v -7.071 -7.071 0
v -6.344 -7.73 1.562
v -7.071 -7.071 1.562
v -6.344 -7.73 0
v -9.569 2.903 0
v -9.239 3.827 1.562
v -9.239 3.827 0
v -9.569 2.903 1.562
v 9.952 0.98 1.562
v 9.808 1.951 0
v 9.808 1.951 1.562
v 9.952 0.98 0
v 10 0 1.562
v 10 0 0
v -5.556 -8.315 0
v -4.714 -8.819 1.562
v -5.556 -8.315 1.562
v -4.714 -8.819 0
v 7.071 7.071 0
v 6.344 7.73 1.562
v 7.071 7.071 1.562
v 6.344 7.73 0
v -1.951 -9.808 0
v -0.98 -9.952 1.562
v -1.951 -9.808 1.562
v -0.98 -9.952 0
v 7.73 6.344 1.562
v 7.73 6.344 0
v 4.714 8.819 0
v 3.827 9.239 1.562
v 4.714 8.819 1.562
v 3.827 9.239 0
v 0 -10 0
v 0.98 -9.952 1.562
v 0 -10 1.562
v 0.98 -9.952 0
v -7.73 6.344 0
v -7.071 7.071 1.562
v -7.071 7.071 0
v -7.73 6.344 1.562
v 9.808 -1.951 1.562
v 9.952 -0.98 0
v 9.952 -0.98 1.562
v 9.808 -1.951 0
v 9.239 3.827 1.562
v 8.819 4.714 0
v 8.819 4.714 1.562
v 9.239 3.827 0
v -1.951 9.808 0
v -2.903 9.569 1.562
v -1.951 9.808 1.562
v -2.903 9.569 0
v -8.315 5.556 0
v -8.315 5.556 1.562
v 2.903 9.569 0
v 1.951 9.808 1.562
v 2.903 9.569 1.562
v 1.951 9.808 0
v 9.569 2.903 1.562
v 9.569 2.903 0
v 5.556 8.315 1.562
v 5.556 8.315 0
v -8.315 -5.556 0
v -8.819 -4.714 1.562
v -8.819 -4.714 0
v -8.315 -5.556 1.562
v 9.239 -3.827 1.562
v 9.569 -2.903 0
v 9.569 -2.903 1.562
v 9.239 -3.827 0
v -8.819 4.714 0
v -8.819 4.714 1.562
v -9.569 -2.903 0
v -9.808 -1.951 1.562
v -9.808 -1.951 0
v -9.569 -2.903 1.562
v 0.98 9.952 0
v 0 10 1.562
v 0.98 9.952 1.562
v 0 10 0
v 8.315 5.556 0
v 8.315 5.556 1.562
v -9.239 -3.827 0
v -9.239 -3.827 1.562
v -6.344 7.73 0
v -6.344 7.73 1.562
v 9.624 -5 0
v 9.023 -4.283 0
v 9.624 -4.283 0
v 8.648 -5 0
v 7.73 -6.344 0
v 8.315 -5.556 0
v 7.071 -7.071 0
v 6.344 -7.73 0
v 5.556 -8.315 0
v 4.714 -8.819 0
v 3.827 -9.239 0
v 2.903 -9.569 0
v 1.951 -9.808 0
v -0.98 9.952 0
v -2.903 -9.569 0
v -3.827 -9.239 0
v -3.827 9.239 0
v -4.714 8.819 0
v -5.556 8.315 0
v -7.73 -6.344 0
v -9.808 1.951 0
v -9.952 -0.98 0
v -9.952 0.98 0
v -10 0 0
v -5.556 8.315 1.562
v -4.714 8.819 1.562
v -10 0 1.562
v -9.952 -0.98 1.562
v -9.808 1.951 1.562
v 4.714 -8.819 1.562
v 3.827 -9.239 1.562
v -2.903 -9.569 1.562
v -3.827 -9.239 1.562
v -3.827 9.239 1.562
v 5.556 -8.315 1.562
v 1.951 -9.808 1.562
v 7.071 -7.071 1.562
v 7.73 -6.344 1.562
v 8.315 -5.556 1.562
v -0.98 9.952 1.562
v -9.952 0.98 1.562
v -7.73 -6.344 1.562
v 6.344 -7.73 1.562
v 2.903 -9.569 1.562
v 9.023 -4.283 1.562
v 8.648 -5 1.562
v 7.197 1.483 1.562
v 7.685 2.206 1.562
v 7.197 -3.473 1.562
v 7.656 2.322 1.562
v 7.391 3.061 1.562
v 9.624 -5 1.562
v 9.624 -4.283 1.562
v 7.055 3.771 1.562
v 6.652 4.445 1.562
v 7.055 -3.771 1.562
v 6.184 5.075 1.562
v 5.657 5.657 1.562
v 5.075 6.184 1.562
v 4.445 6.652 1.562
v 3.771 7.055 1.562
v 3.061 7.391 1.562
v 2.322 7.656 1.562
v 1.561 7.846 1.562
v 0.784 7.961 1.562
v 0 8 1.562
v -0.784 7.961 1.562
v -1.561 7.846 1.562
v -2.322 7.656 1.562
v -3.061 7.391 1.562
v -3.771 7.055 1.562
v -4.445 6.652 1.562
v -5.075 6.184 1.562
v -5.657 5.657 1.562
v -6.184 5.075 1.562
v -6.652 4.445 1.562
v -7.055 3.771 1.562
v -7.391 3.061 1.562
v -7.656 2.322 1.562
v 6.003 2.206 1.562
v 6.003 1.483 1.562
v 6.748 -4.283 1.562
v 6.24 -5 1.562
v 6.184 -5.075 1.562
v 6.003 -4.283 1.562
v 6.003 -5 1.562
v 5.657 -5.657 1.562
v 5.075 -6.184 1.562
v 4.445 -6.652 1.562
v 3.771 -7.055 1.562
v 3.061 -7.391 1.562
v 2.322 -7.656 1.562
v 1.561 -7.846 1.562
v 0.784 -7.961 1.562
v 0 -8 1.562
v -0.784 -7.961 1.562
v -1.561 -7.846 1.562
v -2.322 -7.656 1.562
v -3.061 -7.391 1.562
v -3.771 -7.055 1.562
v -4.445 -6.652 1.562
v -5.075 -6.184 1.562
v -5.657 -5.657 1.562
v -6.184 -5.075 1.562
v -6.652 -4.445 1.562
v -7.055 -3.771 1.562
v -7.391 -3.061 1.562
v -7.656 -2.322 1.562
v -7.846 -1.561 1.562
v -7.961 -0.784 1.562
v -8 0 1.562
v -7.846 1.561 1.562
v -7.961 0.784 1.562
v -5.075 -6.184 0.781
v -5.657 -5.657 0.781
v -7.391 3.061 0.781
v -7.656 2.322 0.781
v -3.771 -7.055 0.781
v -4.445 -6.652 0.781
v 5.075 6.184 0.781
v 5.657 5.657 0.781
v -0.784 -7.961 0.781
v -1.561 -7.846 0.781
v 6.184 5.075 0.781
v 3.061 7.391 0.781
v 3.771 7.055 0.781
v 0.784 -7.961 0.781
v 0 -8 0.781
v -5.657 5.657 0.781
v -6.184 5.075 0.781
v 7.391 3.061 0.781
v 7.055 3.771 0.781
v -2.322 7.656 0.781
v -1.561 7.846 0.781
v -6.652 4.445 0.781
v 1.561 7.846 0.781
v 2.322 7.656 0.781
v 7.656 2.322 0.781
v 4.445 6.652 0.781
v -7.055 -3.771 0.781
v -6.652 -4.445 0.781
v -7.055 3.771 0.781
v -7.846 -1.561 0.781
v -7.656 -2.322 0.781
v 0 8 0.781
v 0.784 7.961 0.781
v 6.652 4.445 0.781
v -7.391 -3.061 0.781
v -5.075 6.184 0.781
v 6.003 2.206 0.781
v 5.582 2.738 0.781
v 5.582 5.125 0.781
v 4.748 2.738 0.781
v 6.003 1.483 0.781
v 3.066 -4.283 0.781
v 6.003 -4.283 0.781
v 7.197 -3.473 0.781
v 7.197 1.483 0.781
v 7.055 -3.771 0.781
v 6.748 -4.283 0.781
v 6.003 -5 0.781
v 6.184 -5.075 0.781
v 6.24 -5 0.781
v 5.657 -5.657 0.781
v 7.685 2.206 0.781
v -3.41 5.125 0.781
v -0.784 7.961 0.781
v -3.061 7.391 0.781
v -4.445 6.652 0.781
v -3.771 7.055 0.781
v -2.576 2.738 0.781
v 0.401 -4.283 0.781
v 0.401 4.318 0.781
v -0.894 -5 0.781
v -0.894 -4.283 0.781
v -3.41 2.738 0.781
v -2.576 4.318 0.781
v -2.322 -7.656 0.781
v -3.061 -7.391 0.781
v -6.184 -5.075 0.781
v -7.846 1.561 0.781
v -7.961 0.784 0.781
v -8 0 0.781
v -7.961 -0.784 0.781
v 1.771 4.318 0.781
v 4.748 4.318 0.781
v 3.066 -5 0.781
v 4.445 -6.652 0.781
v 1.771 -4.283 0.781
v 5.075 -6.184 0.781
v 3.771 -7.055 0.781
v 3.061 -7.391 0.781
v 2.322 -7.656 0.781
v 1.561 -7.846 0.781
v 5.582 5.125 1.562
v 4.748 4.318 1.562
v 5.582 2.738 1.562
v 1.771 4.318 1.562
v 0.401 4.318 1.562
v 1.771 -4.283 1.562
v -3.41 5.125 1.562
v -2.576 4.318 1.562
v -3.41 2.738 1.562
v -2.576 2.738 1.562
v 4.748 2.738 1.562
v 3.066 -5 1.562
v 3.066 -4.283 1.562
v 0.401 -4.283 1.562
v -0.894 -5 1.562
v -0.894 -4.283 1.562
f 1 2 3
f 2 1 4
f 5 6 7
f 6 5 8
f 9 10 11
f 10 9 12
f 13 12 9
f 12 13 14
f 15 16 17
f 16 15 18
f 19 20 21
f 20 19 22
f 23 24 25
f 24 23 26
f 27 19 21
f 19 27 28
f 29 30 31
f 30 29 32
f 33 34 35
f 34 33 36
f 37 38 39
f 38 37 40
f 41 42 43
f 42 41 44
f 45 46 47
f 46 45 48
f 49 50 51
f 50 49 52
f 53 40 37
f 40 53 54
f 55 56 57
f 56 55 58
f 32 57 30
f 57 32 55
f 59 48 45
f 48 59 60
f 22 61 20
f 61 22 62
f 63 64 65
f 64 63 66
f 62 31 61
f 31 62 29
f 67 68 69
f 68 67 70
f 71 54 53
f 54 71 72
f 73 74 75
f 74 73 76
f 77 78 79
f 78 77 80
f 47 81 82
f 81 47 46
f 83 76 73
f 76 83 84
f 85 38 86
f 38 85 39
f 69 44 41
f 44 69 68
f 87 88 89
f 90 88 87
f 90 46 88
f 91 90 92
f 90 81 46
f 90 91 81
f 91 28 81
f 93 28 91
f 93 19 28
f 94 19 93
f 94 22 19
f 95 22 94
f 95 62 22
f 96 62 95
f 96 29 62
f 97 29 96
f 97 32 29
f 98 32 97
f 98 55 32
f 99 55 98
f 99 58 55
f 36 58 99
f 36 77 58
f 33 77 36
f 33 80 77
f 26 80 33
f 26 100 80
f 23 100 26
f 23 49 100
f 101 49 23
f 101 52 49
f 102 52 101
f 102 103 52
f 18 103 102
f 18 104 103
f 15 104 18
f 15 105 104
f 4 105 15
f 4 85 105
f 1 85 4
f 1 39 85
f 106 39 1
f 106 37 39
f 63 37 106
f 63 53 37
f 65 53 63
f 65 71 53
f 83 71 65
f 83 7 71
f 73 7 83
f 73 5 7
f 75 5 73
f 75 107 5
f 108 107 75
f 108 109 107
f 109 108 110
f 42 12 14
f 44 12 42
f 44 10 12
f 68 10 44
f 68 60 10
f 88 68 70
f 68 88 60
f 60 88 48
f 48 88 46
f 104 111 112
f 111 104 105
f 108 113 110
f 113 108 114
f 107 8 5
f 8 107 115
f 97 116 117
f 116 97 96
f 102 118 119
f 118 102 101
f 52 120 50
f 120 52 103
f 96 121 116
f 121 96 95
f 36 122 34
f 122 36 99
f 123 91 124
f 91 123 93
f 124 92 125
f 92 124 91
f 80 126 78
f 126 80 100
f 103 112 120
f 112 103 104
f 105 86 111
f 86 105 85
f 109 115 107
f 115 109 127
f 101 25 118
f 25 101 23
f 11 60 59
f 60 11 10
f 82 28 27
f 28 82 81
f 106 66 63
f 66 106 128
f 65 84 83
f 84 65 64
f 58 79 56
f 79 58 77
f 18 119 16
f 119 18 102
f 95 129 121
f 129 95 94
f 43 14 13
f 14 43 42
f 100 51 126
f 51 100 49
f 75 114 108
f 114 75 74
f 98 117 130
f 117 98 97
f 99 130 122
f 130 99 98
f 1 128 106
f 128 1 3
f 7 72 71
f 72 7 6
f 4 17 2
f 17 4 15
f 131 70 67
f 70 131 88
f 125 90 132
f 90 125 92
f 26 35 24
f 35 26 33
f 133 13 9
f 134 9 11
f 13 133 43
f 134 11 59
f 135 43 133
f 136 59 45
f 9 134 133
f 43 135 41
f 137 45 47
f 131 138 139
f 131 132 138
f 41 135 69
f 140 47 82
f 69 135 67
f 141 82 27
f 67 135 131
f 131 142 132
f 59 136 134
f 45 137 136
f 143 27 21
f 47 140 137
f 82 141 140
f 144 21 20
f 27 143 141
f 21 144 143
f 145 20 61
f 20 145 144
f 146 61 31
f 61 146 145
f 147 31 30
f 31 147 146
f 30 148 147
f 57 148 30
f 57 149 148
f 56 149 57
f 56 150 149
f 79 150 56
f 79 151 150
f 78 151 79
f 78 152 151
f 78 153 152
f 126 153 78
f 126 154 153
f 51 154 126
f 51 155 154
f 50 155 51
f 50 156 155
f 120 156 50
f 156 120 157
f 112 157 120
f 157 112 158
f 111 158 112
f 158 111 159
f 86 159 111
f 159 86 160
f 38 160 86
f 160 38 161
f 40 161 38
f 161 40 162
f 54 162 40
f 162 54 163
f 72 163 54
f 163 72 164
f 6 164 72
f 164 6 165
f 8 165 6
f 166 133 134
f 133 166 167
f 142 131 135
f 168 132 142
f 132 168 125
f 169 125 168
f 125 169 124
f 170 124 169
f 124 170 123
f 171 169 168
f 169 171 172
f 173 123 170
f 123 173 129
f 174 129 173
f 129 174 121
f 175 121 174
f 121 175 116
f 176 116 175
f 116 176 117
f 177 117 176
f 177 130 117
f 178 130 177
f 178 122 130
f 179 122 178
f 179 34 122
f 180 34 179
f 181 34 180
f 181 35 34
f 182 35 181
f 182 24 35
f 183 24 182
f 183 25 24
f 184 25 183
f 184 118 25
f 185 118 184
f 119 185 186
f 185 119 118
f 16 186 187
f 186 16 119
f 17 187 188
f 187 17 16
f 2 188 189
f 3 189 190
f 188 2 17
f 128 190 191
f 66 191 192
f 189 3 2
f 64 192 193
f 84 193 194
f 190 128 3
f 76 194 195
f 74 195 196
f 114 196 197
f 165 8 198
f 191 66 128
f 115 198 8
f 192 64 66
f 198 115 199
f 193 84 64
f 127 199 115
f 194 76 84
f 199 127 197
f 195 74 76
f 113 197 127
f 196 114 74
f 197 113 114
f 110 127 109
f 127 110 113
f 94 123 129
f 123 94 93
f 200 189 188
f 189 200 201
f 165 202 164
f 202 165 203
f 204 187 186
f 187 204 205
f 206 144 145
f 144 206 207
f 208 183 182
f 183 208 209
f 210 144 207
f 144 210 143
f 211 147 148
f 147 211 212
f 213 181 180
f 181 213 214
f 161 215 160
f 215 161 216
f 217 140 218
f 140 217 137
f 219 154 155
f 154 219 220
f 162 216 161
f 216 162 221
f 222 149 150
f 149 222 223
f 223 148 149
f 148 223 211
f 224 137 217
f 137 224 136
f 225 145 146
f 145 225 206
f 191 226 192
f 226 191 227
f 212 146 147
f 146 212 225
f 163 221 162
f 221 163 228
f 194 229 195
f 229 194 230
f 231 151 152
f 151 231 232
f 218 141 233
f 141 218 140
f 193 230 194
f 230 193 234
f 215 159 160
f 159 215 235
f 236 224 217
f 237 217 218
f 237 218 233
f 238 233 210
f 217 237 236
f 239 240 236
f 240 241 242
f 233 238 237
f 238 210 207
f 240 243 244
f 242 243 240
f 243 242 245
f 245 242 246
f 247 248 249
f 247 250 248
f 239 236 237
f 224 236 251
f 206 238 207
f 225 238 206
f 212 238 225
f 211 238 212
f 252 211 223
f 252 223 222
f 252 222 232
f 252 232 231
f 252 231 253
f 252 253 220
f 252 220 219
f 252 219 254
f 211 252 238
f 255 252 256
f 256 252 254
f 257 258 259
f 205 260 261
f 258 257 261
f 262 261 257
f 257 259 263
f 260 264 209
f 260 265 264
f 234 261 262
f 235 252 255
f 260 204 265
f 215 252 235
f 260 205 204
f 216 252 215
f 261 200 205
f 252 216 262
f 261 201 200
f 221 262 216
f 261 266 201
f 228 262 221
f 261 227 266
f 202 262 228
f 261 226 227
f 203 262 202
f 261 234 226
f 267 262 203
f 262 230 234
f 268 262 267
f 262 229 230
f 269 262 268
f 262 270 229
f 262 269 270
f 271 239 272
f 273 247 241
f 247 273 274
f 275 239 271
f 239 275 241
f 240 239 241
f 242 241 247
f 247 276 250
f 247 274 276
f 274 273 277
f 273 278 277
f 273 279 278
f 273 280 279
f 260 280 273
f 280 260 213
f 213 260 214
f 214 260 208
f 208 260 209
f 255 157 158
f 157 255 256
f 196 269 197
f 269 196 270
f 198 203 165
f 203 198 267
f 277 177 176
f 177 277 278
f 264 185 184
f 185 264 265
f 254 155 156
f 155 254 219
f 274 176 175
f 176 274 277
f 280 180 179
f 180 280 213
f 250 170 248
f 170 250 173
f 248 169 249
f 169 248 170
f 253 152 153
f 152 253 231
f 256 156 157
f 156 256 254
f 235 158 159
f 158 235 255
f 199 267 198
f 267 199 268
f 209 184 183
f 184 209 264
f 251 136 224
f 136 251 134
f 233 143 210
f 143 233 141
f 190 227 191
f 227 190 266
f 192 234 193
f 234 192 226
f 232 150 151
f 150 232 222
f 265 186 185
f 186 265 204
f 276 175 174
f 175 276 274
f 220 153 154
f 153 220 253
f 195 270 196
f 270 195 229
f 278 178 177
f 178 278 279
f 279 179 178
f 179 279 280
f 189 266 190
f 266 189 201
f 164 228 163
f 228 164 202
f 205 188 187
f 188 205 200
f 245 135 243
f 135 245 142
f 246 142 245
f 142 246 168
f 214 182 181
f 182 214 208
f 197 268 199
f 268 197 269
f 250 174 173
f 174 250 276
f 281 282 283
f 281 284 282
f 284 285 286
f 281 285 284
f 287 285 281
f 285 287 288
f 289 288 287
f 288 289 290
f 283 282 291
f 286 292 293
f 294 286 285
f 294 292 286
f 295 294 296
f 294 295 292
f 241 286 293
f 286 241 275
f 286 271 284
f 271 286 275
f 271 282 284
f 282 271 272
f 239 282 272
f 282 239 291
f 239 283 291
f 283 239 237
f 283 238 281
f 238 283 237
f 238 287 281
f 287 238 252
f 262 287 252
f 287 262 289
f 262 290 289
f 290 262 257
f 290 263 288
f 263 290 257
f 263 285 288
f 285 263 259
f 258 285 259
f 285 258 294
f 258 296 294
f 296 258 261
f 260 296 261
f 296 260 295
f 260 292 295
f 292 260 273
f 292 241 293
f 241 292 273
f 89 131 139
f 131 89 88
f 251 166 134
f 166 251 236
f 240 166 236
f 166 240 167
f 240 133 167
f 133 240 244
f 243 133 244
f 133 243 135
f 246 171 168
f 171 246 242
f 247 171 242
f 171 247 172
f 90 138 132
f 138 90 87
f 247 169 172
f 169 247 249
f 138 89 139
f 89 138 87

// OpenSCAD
$fn = 64;

size_index = 100;
button_radius = size_index/10;
rim_size = size_index/100;
internal_radius = button_radius - rim_size*2;
//button_height = 1.8;
button_height = size_index/64;
button_drop = button_height/2;
font_size = size_index/10;

text = "Align";
 
difference() {
    cylinder(r = button_radius, h = button_height);
    translate([0, 0, button_drop]) {
        cylinder(r = internal_radius, h = button_drop);
    }
    
}


content = "Ti";
//font = "Liberation Sans";
//font = "Comic Sans"; 
font = "Palatino";

translate ([-(font_size/2.2)+1,-(font_size/2),0]) {
   linear_extrude(height = button_height) {
       text(content, font = font, size = font_size);
     }
 }
